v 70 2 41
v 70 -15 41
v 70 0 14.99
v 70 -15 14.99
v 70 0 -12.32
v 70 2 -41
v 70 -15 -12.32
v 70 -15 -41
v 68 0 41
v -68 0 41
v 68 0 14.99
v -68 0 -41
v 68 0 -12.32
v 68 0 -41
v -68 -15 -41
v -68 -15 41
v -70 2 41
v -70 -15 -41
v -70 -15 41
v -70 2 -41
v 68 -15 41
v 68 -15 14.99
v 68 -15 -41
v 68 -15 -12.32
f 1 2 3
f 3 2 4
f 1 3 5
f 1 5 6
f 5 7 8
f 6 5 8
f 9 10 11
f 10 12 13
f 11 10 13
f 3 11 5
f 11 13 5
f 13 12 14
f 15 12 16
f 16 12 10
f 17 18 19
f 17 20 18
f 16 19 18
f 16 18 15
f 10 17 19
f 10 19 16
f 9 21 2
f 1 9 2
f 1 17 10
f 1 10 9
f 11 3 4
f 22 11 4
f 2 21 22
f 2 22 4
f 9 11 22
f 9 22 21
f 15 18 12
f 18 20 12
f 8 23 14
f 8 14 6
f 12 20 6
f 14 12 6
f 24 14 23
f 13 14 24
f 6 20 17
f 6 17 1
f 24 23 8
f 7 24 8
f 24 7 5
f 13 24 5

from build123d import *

# Parameters (mm, degrees)
EXTRUDE_1_DEPTH     = 2
SKETCH_2_W          = 2
SKETCH_2_H          = 82
EXTRUDE_2_DEPTH     = 15
CUT_EXTRUDE_2_DEPTH = 20


with BuildPart() as part:
    # 草图1 → 凸台-拉伸1 (new body)
    with BuildSketch(Plane(origin=(0, 0, 0), x_dir=(1, 0, 0), z_dir=(0, 1, 0))):
        Polygon((0, -41), (70, -41), (70, -6.017578489), (70, 41), (0, 41), (-70, 41), (-70, 0), (-70, -41), align=None)
    extrude(amount=EXTRUDE_1_DEPTH)

    # 草图2 → 凸台-拉伸2 (add)
    with BuildSketch(Plane.XZ):
        with Locations((-69, 0)):
            Rectangle(SKETCH_2_W, SKETCH_2_H)
        with Locations((69, 0)):
            Rectangle(SKETCH_2_W, SKETCH_2_H)
    extrude(amount=EXTRUDE_2_DEPTH)

    # 草图4 → 切除-拉伸2 (cut)
    with BuildSketch(Plane(origin=(70, 0, 0), x_dir=(0, 0, -1), z_dir=(1, 0, 0))):
        Polygon((0, 0), (-14.99, 0), (-14.99, -15), (12.32, -15), (12.32, 0), align=None)
    extrude(amount=-CUT_EXTRUDE_2_DEPTH, mode=Mode.SUBTRACT)


solid = part.part
